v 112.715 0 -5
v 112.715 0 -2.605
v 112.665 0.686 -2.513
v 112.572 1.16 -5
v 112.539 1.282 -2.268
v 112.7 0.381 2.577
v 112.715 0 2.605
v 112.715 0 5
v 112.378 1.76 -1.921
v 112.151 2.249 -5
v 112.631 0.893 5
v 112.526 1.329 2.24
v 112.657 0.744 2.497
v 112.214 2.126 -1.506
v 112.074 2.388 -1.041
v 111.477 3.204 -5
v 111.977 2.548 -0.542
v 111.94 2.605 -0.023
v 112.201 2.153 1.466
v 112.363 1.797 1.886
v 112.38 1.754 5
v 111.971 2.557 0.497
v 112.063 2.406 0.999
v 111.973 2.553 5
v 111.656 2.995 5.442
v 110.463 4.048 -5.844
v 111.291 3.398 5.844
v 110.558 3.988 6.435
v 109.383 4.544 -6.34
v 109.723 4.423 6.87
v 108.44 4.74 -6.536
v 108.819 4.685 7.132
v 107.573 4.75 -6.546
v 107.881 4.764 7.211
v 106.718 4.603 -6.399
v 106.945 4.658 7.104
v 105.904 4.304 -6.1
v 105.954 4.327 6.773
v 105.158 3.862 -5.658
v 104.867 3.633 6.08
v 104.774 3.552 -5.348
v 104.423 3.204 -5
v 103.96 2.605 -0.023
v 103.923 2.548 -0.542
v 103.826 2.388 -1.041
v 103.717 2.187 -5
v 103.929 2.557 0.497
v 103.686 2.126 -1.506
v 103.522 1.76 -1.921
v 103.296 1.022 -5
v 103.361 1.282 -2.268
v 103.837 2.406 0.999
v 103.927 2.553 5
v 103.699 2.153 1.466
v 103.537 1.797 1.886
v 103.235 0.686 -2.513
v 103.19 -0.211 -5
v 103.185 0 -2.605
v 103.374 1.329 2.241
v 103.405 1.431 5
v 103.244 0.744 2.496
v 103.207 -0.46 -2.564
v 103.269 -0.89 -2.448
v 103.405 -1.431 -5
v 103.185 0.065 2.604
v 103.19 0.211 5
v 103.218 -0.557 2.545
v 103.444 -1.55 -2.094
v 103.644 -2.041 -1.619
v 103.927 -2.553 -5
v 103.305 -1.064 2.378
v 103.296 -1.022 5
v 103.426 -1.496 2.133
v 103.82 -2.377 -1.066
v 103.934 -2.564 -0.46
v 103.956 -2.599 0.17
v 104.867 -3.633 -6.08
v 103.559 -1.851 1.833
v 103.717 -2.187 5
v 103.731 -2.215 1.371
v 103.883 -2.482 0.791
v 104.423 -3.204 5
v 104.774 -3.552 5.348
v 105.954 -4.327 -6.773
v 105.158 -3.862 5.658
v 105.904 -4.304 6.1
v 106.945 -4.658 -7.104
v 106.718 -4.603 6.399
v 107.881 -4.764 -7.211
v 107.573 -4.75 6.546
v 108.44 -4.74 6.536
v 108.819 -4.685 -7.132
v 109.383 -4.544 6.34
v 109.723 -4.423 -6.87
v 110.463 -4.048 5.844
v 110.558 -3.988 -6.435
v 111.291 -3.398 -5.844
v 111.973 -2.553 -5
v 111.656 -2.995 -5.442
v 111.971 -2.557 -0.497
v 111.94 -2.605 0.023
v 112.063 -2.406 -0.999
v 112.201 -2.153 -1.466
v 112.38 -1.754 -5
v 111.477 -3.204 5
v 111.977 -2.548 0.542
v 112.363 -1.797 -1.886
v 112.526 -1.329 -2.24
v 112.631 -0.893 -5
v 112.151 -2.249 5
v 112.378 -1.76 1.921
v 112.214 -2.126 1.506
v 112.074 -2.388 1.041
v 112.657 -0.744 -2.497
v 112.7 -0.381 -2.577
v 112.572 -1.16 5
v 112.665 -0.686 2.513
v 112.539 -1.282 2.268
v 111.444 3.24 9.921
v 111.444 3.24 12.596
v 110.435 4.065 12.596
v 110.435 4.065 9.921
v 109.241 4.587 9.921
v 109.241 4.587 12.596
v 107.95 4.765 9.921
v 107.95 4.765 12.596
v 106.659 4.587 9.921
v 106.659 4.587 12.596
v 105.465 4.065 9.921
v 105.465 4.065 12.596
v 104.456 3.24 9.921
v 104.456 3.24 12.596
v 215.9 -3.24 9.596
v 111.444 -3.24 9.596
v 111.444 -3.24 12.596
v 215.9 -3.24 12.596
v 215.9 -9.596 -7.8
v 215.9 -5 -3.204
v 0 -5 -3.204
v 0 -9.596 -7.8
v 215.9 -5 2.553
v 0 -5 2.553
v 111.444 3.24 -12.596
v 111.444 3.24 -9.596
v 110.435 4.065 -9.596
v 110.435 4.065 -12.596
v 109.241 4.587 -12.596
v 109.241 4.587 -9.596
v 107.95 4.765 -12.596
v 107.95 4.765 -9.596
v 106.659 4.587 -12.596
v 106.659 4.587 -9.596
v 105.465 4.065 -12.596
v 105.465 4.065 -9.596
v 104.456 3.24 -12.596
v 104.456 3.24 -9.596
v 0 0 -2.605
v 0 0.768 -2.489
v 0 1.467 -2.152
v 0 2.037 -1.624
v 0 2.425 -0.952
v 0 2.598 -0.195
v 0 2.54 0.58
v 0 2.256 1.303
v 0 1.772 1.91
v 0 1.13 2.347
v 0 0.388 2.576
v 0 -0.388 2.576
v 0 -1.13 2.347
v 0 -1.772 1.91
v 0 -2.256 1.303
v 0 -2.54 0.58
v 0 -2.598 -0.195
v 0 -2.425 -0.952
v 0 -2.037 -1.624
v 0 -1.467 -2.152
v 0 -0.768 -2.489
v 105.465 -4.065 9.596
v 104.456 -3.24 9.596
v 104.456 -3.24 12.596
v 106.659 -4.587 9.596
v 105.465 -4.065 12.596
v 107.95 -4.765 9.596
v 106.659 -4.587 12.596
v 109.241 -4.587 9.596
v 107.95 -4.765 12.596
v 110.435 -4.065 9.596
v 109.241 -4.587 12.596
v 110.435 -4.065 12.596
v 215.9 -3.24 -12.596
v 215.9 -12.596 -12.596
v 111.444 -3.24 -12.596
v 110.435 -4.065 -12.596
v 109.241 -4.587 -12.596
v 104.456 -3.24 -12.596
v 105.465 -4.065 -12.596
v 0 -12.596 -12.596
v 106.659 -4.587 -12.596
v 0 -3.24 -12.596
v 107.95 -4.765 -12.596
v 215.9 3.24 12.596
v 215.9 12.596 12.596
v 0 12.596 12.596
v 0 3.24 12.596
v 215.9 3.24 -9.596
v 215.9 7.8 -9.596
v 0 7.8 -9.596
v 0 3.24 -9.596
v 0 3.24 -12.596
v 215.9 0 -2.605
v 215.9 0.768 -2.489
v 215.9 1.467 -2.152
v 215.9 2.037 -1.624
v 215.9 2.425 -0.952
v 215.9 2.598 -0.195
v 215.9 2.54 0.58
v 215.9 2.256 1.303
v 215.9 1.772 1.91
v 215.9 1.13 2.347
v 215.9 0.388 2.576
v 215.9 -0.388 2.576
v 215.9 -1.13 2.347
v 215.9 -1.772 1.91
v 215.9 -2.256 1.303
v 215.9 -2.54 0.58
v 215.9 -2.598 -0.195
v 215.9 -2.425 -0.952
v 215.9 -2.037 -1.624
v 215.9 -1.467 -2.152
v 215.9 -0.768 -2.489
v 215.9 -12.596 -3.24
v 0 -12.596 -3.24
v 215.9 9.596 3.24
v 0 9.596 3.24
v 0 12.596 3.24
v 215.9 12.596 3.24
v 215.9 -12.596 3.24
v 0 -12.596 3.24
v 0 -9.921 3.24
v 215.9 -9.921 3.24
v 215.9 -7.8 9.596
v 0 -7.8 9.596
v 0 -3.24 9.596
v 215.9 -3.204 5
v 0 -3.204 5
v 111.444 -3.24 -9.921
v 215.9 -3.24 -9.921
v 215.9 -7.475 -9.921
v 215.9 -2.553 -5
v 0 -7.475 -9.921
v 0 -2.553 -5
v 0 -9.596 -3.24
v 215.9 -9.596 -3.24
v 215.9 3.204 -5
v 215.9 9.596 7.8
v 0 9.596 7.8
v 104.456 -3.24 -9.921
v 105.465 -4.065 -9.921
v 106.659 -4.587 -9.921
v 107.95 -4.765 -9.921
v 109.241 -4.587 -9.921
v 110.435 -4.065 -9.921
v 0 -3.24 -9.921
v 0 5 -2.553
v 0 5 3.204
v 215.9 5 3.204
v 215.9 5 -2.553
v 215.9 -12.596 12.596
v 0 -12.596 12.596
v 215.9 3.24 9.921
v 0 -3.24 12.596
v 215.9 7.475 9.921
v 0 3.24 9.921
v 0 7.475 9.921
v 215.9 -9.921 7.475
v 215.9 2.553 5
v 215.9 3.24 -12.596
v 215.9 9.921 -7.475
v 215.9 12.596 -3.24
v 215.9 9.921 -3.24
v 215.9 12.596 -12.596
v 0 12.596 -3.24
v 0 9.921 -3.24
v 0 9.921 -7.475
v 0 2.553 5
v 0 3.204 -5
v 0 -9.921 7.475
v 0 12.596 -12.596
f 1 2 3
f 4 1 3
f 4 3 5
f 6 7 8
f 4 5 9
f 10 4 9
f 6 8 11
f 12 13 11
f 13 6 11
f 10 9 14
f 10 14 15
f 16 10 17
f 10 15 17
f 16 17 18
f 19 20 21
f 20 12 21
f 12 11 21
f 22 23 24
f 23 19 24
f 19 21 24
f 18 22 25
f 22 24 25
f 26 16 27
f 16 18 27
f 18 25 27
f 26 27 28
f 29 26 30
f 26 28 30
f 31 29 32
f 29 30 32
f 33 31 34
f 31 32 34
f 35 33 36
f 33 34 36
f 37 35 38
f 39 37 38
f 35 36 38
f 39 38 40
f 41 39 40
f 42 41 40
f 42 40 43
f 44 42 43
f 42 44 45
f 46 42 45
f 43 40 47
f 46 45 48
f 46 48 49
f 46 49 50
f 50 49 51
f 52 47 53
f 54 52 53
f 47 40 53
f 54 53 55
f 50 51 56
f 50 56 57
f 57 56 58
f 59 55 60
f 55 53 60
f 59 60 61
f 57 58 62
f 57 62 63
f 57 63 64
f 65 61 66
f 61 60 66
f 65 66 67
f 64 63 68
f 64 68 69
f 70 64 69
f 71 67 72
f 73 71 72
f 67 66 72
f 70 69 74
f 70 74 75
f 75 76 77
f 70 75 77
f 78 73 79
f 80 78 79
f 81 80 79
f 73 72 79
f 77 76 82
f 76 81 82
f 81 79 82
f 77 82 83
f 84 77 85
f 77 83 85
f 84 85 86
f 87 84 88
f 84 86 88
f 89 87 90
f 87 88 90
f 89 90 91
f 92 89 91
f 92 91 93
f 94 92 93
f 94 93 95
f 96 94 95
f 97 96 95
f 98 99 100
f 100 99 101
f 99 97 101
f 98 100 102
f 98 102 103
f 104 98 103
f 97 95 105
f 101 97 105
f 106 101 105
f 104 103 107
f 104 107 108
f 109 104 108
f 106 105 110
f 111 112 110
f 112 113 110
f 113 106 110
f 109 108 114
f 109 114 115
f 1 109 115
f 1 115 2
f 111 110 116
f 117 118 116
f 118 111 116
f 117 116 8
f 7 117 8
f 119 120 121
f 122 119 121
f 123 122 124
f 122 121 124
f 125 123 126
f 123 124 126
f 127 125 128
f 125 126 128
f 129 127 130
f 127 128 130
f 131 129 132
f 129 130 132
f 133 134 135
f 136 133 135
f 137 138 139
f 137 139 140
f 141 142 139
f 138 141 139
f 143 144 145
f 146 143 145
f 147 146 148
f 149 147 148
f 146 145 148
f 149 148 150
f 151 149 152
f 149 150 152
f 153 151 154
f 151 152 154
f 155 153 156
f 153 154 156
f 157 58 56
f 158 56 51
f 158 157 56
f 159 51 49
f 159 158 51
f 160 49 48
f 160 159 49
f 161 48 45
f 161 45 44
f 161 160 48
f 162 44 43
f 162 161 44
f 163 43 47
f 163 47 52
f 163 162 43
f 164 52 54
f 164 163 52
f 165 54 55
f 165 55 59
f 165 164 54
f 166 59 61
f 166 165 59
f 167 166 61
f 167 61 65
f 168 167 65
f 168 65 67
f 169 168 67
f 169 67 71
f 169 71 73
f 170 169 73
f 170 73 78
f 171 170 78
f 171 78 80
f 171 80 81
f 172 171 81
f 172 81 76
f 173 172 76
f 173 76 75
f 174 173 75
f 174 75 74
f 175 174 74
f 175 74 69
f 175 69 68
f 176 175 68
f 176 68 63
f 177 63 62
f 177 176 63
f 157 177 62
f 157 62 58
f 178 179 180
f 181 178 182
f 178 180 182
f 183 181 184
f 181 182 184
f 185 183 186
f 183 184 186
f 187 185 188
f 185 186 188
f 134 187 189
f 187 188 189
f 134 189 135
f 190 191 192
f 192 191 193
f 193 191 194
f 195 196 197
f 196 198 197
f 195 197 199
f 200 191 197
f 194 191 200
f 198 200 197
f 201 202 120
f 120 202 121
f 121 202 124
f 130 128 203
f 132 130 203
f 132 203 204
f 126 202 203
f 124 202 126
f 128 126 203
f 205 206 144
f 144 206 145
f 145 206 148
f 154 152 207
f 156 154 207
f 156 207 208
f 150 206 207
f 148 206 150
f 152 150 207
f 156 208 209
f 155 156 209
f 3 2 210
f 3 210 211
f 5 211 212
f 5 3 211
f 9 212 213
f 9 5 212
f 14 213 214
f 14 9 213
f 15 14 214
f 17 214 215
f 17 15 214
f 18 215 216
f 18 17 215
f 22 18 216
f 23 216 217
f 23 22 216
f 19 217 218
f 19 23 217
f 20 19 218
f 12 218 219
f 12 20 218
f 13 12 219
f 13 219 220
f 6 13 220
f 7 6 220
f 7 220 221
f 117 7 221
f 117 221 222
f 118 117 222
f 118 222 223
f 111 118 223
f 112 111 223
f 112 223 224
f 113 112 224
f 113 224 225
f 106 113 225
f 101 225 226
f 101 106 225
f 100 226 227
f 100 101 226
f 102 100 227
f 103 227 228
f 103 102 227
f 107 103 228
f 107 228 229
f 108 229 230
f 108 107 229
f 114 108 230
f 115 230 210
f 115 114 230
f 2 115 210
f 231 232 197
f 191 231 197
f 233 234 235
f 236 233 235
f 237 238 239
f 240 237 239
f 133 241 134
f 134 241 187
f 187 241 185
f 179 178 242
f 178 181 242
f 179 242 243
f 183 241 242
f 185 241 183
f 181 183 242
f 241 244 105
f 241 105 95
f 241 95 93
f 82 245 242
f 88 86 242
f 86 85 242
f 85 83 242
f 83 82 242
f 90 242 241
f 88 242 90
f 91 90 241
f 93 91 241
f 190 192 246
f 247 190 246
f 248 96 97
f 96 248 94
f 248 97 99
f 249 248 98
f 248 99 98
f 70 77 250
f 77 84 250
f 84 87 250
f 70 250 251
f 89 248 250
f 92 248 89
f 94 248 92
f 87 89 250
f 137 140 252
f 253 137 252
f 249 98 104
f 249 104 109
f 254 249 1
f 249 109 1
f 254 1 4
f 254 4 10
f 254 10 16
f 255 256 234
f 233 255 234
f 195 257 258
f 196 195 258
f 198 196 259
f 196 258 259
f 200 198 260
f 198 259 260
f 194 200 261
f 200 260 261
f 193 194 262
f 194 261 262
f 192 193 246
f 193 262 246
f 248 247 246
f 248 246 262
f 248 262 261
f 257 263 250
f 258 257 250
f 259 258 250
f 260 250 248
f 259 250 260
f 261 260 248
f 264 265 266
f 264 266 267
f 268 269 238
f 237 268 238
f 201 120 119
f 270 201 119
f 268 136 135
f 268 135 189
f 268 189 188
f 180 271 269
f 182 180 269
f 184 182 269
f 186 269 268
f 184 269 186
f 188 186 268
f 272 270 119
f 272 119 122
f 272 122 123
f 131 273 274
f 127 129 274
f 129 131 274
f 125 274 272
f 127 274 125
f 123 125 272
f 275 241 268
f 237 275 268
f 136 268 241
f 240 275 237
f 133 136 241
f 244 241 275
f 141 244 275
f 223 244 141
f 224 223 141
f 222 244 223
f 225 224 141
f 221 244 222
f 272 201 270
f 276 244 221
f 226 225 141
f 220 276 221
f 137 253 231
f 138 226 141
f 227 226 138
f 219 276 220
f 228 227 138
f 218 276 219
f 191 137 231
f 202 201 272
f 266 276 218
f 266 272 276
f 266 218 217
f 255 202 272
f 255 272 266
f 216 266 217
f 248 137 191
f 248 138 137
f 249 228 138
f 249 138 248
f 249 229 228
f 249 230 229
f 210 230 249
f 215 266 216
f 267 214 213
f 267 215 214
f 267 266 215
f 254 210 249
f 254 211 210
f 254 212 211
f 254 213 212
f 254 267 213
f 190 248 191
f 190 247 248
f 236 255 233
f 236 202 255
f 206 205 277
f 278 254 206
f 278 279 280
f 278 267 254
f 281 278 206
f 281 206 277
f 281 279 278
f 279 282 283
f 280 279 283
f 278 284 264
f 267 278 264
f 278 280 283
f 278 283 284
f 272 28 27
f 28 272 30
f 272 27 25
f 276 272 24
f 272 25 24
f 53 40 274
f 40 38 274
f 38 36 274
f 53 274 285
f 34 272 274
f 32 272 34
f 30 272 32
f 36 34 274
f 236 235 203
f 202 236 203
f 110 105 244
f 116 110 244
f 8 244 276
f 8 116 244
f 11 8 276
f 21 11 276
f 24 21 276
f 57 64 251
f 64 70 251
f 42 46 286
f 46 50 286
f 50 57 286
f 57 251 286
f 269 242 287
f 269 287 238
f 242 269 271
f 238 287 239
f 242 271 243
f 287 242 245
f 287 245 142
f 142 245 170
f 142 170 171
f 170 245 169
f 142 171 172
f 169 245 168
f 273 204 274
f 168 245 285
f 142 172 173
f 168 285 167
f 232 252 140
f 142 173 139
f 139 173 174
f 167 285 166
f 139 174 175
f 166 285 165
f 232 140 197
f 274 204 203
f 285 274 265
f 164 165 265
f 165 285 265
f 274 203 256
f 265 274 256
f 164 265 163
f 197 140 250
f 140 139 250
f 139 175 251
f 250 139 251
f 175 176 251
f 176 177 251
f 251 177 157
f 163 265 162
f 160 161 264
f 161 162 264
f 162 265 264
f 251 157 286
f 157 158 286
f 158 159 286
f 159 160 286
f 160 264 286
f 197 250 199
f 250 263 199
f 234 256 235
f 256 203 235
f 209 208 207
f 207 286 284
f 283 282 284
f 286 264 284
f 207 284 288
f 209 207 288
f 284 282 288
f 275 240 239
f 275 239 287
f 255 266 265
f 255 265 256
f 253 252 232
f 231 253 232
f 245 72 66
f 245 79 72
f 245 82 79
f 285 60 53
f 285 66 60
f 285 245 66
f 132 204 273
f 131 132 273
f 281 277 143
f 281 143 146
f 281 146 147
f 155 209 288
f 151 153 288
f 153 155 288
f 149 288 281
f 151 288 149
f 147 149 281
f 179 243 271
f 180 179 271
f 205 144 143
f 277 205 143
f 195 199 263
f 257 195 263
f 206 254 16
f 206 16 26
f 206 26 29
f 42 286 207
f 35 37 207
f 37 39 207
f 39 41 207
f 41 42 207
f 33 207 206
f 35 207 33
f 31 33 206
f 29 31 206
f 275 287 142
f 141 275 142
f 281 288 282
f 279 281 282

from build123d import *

# Parameters (mm, degrees)
SKETCH1_R               = 2.605
BOSS_EXTRUDE1_DEPTH     = 215.9
CIRPATTERN1_COUNT       = 4
CUT_EXTRUDE2_DEPTH      = 10
CUT_EXTRUDE2_DEPTH_BACK = 50
SKETCH2_R               = 4.765


with BuildPart() as part:
    # Sketch1 → Boss-Extrude1 (new body)
    with BuildSketch(Plane(origin=(0, 0, 0), x_dir=(0, 0, -1), z_dir=(1, 0, 0))):
        Polygon((5, -5), (5, 3.203948776), (9.596194078, 7.800142853), (9.596194078, 3.24), (12.596194078, 3.24), (12.596194078, 12.596194078), (3.24, 12.596194078), (3.24, 9.921463197), (7.474873734, 9.921463197), (2.553410537, 5), (-5, 5), (-5, -5), align=None)
        Circle(SKETCH1_R, mode=Mode.SUBTRACT)
    boss_extrude1 = extrude(amount=BOSS_EXTRUDE1_DEPTH)

    # CirPattern1: Boss-Extrude1 ×4 about axis
    cirpattern1_axis = Axis((0, 0, 0), (1, 0, 0))
    for i in range(1, CIRPATTERN1_COUNT):
        add(boss_extrude1.rotate(cirpattern1_axis, i * 360 / CIRPATTERN1_COUNT))

    # Sketch2 → Cut-Extrude2 (cut, two sides: drawn at the far end of the back side and taken through both)
    with BuildSketch(Plane.XY.offset(12.596194078).offset(-CUT_EXTRUDE2_DEPTH_BACK)):
        with Locations((107.95, 0)):
            Circle(SKETCH2_R)
    extrude(amount=CUT_EXTRUDE2_DEPTH + CUT_EXTRUDE2_DEPTH_BACK, mode=Mode.SUBTRACT)


solid = part.part
